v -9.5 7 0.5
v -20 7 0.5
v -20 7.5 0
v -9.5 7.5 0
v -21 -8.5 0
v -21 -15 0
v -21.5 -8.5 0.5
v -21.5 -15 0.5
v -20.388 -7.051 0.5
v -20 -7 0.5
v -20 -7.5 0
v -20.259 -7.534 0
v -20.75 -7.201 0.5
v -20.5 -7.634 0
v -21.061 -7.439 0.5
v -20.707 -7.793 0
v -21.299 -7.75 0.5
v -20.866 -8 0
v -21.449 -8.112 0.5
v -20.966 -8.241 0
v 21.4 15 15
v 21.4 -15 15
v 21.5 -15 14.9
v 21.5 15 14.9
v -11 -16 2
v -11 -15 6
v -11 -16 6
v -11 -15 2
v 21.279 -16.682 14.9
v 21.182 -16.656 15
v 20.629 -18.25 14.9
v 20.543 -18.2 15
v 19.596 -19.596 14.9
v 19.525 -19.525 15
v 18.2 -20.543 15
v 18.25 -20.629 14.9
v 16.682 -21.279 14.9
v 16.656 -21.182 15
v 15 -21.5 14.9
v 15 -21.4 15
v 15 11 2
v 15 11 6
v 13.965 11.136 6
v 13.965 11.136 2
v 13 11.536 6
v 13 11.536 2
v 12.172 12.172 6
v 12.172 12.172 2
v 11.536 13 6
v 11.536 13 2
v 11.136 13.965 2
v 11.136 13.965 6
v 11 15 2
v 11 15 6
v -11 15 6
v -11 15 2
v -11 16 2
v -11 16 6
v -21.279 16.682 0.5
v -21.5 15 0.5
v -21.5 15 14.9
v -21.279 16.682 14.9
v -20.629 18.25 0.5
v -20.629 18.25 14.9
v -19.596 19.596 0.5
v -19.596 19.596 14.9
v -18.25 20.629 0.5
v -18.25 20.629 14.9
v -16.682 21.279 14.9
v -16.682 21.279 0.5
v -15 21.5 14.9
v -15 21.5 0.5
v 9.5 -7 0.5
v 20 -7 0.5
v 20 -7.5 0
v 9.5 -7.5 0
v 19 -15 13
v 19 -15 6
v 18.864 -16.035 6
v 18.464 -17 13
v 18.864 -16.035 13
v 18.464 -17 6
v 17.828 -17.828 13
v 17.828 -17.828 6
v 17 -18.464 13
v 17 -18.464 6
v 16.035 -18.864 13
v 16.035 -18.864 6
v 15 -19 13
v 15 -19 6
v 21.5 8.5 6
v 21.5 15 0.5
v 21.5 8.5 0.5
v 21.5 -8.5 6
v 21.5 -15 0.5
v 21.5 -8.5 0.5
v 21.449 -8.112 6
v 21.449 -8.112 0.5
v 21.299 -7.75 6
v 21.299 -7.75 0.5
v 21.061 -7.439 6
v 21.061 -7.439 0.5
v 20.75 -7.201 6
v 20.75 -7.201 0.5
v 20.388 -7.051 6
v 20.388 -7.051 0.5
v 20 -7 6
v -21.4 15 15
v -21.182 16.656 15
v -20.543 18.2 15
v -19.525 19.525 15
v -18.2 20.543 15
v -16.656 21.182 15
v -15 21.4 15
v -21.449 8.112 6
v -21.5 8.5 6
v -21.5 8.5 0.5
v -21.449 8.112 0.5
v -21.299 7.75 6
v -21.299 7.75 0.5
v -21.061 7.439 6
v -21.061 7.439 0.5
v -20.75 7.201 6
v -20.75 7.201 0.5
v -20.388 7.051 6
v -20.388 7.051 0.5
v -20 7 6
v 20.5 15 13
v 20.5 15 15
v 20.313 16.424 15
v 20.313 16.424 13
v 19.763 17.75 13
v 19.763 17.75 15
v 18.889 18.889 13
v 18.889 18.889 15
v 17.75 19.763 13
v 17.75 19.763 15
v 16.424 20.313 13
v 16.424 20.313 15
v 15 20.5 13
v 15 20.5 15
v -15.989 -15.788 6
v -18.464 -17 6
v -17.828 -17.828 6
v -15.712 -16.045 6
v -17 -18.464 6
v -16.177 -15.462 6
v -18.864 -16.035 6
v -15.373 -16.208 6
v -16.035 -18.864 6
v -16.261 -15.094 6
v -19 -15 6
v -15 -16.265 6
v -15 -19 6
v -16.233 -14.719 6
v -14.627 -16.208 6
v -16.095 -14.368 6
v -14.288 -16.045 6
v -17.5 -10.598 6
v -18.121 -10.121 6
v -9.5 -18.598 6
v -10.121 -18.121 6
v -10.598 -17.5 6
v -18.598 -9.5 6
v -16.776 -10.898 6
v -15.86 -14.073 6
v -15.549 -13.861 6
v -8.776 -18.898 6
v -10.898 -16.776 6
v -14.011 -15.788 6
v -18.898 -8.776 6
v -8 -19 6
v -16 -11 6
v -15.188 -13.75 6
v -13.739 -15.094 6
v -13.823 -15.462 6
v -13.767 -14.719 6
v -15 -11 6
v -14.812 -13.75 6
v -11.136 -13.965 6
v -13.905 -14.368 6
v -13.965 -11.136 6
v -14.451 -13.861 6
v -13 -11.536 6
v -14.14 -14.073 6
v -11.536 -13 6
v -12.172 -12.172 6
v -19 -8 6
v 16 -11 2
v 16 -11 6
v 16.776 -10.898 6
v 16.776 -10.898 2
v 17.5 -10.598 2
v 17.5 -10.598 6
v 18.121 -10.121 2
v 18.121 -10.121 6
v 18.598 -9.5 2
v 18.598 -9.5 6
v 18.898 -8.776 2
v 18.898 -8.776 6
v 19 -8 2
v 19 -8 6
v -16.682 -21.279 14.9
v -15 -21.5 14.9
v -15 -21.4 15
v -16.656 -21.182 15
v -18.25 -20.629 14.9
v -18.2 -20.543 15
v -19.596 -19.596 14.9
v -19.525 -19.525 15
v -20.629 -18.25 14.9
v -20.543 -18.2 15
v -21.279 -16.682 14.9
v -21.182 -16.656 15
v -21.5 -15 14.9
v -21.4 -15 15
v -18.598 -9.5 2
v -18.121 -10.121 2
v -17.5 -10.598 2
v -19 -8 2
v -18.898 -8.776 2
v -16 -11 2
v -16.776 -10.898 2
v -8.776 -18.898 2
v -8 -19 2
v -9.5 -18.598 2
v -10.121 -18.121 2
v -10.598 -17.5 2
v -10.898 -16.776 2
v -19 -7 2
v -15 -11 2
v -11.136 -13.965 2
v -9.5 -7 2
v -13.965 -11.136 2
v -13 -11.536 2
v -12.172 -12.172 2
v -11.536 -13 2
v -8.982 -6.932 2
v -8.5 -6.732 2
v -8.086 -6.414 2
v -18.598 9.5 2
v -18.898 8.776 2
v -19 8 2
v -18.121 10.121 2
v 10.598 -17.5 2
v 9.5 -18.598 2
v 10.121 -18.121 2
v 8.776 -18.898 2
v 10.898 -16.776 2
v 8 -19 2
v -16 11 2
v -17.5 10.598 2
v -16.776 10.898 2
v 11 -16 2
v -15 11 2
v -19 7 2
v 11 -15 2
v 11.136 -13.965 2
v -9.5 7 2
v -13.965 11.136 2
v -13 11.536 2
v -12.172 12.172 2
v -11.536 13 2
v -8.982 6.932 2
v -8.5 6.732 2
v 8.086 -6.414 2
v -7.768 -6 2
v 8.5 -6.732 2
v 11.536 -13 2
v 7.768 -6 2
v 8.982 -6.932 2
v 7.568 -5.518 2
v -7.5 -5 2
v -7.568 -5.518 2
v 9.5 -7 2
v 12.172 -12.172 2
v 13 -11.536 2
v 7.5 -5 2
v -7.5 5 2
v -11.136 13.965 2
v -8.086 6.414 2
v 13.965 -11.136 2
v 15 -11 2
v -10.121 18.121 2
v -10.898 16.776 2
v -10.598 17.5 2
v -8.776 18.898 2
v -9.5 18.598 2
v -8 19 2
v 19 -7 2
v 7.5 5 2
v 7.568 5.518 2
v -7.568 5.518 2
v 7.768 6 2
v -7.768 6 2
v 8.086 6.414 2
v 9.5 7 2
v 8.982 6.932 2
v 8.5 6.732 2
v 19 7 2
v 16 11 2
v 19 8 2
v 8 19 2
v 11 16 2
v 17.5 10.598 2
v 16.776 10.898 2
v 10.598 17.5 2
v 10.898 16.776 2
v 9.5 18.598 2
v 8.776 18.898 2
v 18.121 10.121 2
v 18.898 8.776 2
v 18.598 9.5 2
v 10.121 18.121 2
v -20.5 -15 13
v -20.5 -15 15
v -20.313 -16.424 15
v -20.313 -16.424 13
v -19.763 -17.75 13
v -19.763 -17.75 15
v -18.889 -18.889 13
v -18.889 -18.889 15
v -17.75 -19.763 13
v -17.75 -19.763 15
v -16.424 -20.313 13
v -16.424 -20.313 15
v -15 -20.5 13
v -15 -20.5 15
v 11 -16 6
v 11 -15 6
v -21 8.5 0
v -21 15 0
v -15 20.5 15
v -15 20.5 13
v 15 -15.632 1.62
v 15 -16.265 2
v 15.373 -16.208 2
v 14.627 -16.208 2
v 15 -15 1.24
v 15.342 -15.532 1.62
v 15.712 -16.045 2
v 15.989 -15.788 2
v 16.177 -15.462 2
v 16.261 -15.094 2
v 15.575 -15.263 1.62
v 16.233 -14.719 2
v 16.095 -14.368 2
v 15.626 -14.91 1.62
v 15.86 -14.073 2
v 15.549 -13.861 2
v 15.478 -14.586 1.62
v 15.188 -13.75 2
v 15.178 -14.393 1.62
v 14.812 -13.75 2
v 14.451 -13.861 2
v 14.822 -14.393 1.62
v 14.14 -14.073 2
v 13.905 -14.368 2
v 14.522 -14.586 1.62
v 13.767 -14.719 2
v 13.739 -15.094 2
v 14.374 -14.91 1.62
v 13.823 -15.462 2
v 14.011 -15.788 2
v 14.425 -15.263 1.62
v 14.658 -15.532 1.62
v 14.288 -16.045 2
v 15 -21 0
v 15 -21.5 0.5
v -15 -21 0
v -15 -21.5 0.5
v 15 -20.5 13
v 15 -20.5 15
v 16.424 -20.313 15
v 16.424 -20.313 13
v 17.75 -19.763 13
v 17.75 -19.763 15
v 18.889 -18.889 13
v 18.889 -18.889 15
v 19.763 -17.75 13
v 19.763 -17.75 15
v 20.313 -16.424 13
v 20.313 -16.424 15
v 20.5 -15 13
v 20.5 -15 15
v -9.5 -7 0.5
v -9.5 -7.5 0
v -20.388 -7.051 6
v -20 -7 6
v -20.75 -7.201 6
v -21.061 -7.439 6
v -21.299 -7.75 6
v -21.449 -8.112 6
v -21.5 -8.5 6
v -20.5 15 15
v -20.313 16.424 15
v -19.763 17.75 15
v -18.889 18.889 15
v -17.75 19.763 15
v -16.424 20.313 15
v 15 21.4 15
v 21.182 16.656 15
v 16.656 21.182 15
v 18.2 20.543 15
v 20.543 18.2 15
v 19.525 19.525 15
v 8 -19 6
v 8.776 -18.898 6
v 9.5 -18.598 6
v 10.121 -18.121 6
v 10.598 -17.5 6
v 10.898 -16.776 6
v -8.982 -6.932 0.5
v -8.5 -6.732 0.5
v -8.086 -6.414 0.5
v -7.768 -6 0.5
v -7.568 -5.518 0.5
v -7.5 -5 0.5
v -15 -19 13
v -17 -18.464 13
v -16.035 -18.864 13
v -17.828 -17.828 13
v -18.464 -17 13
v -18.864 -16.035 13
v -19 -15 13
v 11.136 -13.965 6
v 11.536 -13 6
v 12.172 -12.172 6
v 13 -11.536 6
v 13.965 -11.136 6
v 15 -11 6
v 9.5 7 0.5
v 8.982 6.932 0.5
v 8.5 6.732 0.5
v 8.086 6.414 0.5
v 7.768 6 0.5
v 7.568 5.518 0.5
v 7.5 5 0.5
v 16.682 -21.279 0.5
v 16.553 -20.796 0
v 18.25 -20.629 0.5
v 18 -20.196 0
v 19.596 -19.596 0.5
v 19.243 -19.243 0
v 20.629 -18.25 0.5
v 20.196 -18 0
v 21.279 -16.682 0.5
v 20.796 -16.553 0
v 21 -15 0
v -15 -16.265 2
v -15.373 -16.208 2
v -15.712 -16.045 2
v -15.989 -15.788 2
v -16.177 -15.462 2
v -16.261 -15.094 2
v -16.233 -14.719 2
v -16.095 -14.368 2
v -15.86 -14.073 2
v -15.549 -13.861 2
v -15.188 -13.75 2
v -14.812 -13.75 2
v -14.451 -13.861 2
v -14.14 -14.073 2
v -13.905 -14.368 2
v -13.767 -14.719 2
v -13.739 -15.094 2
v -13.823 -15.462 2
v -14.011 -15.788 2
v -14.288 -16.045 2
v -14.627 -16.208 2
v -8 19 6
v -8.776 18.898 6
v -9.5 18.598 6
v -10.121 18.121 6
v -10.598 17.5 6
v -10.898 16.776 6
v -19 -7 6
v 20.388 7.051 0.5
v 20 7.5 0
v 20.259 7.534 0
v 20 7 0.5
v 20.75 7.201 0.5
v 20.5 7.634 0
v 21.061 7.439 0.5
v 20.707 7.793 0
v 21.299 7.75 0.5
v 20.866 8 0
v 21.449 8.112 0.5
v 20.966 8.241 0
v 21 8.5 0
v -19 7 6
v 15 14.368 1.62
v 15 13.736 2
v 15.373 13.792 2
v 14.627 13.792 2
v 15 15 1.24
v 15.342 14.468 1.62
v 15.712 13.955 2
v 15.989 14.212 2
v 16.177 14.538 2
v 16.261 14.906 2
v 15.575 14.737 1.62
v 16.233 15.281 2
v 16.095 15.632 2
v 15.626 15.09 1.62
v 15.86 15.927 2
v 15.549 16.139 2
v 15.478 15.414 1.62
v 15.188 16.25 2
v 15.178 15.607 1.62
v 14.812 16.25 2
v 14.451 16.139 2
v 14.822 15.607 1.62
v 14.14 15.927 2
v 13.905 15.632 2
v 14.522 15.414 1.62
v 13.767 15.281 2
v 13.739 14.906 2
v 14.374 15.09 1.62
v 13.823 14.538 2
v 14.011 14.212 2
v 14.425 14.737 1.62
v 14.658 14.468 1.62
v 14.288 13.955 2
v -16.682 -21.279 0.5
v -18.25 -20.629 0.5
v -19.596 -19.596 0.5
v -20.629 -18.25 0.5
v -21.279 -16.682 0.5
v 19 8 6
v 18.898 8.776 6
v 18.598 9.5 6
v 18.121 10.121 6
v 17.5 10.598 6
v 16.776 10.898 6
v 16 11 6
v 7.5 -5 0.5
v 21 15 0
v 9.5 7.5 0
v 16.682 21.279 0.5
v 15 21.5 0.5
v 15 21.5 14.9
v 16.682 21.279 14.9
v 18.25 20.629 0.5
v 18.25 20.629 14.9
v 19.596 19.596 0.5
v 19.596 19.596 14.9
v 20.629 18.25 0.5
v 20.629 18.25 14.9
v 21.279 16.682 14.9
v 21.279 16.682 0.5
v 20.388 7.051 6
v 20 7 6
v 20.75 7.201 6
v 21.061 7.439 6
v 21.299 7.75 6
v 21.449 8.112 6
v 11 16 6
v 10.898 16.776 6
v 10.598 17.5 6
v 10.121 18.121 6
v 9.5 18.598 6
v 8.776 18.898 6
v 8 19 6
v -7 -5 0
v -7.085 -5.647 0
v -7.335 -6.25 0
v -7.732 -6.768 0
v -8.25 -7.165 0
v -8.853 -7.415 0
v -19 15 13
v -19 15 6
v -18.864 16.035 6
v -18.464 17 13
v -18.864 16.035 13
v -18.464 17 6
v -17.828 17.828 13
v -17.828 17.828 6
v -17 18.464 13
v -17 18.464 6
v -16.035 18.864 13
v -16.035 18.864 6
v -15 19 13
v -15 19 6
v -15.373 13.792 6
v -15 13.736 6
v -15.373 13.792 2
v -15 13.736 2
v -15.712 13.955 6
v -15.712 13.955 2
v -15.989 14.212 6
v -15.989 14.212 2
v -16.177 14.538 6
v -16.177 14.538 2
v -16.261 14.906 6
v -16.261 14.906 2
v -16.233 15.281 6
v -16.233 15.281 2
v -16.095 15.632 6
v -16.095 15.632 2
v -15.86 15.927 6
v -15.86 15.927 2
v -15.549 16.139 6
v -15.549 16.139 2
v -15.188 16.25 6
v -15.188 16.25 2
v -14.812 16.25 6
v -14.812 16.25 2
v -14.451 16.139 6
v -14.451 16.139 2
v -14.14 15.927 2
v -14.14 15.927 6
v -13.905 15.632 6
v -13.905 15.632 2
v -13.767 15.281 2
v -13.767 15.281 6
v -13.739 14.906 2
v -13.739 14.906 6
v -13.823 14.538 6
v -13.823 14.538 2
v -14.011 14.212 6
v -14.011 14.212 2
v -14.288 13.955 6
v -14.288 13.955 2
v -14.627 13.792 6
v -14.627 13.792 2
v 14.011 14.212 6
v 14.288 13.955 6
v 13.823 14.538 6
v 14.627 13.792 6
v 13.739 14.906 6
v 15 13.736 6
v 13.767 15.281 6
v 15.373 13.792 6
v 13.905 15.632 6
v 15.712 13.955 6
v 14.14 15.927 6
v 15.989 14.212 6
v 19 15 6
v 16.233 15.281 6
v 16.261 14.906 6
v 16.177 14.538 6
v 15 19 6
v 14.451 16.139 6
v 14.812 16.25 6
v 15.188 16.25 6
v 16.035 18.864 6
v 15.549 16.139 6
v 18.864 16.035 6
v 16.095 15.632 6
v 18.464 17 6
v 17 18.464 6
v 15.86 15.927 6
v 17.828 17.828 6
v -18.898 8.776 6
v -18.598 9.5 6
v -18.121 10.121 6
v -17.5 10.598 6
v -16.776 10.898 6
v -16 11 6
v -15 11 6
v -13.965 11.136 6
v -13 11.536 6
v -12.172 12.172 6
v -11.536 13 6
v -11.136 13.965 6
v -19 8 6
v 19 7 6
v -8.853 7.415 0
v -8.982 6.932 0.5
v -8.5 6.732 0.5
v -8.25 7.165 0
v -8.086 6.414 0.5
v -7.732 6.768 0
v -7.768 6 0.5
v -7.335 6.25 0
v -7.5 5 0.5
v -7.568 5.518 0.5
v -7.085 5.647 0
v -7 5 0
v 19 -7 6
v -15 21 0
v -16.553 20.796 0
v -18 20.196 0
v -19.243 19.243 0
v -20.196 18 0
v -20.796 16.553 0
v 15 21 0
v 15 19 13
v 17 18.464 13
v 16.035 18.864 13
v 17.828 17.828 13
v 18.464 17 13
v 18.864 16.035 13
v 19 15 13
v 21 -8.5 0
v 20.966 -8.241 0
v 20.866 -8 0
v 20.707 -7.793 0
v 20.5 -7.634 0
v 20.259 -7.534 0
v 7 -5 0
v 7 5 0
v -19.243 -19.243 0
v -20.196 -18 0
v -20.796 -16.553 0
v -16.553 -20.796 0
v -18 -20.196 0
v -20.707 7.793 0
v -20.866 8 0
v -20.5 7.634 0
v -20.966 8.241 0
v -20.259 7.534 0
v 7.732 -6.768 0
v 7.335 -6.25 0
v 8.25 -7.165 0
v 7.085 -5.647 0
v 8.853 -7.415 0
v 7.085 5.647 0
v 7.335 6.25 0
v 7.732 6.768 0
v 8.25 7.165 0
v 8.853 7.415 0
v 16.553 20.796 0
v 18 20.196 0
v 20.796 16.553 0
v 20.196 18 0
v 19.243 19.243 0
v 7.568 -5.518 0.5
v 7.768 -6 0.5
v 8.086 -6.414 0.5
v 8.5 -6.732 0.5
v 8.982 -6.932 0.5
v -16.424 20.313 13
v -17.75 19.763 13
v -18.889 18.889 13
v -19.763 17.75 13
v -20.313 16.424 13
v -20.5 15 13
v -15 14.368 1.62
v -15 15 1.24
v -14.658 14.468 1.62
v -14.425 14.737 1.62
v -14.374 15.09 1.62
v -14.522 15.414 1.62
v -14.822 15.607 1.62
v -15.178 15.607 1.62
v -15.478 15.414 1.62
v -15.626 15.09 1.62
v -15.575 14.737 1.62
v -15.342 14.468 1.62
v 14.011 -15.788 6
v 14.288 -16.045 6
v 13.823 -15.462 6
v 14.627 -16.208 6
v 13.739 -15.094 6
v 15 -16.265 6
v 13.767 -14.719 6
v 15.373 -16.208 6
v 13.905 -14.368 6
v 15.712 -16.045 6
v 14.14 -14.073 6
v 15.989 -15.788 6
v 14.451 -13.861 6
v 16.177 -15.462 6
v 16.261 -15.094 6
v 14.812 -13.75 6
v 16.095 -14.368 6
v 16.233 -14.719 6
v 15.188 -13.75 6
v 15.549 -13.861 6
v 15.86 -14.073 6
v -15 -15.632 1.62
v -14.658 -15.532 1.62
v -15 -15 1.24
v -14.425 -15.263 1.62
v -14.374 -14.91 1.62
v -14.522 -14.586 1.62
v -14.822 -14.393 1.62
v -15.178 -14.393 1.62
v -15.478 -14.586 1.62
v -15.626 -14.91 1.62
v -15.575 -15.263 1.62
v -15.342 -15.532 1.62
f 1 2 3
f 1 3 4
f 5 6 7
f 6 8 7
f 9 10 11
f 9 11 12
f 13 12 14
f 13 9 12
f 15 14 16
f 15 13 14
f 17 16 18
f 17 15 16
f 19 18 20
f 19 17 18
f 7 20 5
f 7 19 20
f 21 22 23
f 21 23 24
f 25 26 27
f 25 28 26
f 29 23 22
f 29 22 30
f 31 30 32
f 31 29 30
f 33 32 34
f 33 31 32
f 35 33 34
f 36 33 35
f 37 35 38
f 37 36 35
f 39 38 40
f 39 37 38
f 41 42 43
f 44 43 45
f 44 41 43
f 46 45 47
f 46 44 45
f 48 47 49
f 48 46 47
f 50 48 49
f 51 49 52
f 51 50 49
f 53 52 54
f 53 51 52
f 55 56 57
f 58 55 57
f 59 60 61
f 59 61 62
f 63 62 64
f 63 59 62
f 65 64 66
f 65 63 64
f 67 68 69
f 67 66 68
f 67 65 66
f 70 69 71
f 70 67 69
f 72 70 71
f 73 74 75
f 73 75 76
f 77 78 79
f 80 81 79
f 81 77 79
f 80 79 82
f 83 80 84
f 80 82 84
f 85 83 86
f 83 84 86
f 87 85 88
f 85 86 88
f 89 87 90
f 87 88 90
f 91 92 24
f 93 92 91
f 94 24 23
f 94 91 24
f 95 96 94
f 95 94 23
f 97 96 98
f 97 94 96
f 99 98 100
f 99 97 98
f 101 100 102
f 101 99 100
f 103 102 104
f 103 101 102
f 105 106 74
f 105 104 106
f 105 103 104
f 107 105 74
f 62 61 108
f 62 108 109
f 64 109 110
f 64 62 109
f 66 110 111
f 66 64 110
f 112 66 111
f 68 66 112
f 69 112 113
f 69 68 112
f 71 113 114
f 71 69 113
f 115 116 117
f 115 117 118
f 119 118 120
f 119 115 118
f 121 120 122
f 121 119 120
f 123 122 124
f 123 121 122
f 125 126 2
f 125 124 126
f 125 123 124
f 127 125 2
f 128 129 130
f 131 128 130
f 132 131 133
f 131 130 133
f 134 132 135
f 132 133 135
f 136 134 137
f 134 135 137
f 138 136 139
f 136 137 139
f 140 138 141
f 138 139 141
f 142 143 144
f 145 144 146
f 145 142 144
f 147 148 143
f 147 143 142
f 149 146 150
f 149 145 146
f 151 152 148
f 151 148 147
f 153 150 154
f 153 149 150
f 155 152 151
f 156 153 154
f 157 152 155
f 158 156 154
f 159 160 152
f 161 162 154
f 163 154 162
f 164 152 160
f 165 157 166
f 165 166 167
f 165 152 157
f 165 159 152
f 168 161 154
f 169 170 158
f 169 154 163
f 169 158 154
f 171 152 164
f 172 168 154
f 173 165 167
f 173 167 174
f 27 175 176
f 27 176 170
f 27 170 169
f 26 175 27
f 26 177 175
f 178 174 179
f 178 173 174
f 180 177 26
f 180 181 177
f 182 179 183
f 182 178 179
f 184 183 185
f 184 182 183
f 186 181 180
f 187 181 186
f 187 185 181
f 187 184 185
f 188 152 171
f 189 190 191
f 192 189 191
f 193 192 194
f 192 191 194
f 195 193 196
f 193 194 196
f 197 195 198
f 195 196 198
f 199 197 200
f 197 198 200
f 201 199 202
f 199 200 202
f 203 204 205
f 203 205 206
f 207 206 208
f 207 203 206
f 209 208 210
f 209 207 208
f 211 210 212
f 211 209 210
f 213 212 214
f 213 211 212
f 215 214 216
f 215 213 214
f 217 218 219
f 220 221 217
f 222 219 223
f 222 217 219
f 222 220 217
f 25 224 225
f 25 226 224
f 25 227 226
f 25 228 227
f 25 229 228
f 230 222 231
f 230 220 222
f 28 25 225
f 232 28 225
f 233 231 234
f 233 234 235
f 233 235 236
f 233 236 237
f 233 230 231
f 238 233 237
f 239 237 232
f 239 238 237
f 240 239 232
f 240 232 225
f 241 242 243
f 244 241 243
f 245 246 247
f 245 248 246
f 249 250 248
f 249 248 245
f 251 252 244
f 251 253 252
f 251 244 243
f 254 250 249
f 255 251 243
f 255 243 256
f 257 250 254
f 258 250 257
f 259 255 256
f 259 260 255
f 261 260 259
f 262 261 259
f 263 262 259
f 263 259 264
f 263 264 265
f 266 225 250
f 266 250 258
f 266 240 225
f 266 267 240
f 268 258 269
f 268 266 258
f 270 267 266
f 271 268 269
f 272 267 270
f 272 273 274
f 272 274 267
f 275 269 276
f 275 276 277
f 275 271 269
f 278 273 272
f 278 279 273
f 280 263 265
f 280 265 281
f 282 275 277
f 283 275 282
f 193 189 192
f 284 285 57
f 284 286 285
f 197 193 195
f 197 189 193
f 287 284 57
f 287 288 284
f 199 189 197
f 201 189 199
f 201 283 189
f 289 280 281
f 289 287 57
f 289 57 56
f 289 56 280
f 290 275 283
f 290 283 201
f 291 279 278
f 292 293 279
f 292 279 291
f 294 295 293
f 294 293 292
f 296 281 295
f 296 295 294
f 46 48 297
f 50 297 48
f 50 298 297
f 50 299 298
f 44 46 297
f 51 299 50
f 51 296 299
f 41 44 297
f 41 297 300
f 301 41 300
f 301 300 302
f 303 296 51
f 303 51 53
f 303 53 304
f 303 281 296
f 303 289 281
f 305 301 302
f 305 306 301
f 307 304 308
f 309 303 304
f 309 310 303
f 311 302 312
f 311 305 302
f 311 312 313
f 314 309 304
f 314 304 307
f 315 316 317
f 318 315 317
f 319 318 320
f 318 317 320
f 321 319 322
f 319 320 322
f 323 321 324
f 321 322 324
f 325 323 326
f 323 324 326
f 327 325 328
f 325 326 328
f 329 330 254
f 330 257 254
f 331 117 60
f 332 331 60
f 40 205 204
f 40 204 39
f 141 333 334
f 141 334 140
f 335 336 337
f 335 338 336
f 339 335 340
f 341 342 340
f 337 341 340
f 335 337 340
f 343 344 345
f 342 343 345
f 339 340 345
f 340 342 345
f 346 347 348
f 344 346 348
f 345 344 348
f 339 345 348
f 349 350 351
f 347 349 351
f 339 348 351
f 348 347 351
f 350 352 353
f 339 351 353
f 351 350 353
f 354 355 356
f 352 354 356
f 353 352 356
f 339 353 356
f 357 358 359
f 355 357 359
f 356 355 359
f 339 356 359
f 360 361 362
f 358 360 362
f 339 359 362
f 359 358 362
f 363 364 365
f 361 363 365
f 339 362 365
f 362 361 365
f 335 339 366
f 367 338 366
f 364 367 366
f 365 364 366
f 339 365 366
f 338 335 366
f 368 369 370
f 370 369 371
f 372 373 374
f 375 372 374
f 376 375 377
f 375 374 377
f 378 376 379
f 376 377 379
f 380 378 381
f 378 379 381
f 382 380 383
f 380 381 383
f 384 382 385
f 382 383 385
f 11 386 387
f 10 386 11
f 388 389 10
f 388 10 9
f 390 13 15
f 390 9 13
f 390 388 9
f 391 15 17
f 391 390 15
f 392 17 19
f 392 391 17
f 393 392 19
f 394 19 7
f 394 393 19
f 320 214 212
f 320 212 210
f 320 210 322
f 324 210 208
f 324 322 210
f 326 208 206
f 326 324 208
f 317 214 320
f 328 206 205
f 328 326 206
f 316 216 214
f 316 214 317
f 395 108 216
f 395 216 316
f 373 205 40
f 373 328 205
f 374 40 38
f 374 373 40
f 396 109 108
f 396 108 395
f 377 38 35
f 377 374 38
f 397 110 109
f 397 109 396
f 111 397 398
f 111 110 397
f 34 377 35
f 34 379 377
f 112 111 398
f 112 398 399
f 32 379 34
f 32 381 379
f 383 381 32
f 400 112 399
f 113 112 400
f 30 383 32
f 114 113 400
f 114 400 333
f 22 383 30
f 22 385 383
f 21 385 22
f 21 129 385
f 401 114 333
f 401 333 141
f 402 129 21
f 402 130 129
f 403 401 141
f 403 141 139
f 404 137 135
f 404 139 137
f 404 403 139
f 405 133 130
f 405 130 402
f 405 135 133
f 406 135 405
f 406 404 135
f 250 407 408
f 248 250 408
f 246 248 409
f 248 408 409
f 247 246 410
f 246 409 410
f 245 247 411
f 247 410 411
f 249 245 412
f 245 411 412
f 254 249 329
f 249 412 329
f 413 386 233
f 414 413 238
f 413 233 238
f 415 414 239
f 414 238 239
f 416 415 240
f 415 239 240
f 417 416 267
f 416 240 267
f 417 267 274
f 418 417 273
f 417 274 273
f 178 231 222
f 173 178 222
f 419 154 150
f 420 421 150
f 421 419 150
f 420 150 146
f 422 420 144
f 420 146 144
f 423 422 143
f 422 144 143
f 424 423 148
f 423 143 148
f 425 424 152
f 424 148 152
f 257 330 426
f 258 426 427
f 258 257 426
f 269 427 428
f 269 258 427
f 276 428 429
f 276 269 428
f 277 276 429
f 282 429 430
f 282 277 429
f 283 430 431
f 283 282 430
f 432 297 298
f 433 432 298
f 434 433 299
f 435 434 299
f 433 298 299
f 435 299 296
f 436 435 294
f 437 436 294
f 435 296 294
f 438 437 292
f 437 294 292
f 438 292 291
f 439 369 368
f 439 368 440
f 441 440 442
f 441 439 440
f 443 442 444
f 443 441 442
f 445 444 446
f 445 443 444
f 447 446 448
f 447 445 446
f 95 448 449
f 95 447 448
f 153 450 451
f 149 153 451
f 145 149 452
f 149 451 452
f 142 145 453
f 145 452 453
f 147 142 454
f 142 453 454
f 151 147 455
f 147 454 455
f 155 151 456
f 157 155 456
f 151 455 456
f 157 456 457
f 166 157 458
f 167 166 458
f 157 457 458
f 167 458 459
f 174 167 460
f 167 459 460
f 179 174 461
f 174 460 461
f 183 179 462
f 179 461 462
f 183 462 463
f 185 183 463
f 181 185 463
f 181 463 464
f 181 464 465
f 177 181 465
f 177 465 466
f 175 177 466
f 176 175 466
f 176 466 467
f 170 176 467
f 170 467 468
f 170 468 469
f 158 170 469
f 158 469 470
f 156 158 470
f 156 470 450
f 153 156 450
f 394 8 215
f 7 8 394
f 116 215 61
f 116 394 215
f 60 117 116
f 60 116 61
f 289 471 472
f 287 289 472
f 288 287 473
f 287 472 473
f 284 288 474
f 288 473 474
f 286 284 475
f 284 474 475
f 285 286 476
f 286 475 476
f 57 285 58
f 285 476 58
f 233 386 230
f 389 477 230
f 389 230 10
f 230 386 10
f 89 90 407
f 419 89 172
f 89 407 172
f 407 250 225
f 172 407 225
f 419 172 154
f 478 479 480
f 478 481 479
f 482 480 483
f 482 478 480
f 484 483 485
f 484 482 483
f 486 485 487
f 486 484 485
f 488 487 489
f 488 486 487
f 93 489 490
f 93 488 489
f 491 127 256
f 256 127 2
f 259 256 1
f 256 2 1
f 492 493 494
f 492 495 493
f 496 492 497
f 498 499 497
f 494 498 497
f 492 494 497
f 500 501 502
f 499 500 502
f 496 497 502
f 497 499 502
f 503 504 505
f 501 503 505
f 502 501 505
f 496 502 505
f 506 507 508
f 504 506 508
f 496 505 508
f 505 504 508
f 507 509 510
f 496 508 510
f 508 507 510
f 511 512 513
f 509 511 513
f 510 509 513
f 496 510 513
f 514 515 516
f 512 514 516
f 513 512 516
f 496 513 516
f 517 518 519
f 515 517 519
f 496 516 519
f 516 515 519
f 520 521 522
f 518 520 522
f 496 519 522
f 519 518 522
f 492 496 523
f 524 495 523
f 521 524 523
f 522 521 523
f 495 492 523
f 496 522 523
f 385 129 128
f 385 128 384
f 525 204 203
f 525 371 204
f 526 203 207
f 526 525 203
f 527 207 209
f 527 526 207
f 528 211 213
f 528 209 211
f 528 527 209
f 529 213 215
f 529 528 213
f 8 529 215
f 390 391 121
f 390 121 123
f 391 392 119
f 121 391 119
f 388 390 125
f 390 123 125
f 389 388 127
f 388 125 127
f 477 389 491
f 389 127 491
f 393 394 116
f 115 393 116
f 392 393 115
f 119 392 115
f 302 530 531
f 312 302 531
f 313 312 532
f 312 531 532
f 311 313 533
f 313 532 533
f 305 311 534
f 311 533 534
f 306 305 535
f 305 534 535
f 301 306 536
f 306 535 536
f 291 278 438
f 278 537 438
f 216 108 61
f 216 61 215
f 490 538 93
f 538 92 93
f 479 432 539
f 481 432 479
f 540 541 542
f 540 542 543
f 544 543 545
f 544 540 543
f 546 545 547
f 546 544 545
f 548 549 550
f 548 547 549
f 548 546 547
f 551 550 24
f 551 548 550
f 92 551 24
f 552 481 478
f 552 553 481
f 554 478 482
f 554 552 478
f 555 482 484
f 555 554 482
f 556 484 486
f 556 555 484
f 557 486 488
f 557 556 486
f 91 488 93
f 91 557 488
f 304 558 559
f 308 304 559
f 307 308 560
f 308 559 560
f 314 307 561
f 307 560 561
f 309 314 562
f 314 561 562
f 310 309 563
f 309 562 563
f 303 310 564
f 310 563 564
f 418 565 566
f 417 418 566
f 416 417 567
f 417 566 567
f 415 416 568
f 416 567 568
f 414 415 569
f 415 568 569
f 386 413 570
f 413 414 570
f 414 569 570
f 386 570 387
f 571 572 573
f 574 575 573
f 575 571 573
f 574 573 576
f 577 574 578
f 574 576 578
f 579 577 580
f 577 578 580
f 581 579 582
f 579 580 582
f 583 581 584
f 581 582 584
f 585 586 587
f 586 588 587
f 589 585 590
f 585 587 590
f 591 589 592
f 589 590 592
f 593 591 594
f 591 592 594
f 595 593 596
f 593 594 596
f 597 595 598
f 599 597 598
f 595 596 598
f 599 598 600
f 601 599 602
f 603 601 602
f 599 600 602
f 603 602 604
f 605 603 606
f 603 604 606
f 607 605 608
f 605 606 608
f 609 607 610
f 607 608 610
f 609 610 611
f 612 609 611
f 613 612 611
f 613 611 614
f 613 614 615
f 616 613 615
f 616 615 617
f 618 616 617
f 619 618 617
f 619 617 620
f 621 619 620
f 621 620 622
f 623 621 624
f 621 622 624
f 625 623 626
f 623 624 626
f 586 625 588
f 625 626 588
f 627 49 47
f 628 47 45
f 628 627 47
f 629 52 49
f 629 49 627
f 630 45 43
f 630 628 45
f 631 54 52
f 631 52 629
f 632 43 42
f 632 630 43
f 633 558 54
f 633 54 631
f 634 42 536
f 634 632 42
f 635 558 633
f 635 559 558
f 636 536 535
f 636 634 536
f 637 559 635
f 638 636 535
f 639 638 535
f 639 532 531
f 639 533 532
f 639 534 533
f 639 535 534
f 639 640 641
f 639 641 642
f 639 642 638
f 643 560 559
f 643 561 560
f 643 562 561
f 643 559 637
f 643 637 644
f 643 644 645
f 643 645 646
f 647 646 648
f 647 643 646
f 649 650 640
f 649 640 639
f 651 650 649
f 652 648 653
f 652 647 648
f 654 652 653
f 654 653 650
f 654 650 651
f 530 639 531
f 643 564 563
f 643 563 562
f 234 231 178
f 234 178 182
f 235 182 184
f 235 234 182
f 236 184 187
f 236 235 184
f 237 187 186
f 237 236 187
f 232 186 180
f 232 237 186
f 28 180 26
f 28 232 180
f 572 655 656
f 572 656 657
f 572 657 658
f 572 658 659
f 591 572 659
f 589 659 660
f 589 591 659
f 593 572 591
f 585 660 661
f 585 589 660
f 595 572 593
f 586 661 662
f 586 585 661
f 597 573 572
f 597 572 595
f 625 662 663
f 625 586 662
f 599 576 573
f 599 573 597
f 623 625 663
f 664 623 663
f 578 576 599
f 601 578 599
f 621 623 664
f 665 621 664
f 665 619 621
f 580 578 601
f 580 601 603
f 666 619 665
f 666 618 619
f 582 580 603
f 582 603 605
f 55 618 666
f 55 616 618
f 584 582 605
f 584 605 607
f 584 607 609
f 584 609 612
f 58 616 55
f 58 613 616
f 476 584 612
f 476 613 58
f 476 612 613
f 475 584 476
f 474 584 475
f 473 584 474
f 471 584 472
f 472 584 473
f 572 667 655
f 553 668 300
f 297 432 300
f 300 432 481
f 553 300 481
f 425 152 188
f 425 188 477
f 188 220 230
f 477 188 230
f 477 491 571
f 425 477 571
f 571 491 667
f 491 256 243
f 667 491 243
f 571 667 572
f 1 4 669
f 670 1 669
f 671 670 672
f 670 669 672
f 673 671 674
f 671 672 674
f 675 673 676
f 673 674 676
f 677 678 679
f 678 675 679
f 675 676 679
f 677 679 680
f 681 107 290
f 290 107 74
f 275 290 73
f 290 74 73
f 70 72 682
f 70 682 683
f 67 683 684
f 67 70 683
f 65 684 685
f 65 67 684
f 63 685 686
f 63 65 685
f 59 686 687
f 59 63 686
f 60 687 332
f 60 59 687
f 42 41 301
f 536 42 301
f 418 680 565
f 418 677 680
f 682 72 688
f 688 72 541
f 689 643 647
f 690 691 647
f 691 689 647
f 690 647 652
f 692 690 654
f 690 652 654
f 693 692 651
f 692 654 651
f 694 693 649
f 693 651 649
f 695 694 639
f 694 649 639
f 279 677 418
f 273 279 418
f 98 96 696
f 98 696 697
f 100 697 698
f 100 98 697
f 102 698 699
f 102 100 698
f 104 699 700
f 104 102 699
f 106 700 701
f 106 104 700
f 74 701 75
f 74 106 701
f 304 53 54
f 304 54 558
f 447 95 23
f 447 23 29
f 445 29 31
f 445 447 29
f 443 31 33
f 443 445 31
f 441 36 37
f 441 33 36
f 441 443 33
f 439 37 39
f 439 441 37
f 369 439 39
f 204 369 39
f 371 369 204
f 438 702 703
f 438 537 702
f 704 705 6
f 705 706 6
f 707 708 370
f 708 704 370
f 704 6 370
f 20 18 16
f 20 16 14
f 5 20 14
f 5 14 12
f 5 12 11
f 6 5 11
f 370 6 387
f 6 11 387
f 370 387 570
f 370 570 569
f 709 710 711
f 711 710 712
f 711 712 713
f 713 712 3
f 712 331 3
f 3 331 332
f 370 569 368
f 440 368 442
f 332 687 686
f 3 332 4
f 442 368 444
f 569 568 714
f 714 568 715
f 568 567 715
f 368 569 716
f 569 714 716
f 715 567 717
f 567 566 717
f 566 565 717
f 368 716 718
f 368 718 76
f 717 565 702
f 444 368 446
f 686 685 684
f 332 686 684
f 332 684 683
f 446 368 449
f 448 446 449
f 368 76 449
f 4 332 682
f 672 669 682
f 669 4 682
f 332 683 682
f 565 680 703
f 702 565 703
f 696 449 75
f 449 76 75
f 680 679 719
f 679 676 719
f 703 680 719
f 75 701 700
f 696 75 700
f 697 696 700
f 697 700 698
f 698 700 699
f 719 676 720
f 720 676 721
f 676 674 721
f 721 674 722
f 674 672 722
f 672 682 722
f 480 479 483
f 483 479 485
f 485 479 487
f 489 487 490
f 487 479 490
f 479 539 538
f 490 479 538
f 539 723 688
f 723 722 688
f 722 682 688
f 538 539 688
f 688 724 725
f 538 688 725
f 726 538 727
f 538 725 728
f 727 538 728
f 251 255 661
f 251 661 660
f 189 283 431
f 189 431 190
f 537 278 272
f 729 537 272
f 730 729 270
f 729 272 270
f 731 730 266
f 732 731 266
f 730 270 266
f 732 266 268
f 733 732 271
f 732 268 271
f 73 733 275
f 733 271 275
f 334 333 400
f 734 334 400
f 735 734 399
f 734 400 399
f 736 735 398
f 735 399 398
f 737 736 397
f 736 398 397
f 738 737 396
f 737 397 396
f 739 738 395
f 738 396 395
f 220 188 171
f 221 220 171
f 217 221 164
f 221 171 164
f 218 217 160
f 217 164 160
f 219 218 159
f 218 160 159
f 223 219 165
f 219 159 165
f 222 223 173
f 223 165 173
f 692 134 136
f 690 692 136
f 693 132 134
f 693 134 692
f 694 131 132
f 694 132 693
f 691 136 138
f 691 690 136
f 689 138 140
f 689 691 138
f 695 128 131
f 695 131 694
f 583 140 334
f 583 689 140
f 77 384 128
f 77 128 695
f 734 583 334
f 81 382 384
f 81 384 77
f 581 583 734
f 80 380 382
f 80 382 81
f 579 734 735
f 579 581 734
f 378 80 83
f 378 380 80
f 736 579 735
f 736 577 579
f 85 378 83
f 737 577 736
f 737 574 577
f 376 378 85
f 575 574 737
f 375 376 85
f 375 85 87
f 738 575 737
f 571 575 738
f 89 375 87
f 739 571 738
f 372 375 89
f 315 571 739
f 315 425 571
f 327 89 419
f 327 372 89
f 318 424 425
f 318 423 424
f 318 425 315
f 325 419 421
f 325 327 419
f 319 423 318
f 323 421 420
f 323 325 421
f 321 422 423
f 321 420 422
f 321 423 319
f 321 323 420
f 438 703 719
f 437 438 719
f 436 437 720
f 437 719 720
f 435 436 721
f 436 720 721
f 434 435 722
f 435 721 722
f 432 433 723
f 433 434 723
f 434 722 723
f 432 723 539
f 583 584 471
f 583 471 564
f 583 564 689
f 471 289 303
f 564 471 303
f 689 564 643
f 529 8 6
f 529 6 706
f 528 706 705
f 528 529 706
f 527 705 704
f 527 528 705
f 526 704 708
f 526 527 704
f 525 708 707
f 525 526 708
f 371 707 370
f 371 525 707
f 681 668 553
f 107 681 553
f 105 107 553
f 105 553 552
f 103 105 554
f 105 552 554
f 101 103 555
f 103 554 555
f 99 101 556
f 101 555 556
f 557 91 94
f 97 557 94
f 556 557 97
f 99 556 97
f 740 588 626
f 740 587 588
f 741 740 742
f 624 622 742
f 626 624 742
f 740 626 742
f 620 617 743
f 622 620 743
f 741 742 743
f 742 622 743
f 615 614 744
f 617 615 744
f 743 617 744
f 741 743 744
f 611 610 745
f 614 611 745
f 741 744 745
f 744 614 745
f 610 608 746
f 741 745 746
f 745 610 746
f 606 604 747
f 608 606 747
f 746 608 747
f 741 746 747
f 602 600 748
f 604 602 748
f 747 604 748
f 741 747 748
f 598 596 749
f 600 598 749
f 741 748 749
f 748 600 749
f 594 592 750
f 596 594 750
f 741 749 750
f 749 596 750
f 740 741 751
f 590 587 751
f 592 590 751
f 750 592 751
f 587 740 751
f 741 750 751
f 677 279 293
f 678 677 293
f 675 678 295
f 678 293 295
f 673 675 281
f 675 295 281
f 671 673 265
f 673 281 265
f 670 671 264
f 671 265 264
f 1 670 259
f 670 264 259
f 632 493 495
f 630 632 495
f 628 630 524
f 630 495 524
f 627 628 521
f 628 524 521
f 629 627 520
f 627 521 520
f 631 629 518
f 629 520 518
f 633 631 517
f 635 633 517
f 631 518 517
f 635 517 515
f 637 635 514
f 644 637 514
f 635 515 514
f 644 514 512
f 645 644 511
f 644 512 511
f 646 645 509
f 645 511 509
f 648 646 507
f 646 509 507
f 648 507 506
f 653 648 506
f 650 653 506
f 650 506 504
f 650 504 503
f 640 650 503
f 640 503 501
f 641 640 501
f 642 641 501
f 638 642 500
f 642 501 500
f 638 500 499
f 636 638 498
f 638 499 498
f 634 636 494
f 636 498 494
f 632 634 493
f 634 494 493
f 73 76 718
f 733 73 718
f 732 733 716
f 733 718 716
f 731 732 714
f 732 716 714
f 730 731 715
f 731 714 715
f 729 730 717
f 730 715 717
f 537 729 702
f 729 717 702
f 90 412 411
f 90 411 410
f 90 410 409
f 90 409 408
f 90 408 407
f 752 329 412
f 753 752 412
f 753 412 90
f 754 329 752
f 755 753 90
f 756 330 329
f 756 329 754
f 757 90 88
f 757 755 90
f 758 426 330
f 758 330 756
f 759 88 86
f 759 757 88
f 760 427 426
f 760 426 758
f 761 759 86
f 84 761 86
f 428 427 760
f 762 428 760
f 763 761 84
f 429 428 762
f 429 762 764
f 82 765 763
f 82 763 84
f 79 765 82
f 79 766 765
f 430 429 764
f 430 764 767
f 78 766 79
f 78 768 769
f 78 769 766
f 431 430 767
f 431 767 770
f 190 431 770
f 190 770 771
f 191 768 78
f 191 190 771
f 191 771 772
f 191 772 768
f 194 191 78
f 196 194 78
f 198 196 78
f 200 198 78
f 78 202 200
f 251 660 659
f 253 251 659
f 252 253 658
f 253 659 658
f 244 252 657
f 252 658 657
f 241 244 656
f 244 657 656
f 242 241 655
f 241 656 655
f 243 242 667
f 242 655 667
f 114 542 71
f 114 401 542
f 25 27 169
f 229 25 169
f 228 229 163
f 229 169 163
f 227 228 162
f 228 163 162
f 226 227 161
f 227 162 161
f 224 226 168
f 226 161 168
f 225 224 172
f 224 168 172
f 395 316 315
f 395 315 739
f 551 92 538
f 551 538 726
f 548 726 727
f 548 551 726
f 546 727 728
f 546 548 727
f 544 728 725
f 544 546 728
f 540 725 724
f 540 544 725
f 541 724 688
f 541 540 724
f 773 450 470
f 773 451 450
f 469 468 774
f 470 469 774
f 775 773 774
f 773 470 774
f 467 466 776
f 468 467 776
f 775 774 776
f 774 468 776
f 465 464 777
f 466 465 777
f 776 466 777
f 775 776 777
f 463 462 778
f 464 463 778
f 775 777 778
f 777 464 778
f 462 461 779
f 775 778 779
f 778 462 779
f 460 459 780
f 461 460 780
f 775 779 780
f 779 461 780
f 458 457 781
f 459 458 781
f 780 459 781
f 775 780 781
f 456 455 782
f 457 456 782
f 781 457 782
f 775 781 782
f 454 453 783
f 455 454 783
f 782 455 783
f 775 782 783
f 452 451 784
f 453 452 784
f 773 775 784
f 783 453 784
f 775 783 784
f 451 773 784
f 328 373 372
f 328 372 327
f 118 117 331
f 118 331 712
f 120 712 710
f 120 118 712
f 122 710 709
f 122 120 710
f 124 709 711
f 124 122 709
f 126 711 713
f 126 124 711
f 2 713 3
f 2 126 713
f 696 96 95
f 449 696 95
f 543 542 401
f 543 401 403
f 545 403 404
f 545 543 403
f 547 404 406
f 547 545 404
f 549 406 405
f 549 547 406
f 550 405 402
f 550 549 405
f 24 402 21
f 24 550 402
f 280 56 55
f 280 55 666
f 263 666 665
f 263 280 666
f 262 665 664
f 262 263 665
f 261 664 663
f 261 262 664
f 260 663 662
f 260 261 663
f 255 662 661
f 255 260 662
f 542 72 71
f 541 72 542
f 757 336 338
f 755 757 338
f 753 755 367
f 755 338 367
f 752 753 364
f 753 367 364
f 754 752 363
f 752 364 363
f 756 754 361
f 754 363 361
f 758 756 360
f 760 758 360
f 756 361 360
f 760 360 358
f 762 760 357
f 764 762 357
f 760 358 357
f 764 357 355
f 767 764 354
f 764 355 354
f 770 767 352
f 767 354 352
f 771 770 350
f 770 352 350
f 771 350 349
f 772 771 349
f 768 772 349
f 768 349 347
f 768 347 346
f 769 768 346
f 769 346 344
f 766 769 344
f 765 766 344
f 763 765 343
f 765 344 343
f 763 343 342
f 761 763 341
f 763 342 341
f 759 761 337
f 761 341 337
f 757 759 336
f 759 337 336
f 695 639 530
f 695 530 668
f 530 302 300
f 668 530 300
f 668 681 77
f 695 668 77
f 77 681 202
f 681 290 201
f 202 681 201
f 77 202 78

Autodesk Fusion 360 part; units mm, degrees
sketch "sketch_for_main_body_shape" plane through (0, 0, 0) normal (0, 0, 1) x (1, 0, 0)
  line L0 (15, -18.5) -> (-15, -18.5) construction
  line L1 (-18.5, -15) -> (-18.5, 15) construction
  line L2 (-15, 18.5) -> (15, 18.5) construction
  line L3 (18.5, 15) -> (18.5, -15) construction
  line L4 (18.5, -18.5) -> (-18.5, 18.5) construction
  line L5 (-18.5, -18.5) -> (18.5, 18.5) construction
  arc A0 (-15, 18.5) -> (-18.5, 15) centre (-15, 15) ccw construction
  arc A1 (-18.5, -15) -> (-15, -18.5) centre (-15, -15) ccw construction
  arc A2 (15, -18.5) -> (18.5, -15) centre (15, -15) ccw construction
  arc A3 (18.5, 15) -> (15, 18.5) centre (15, 15) ccw construction
  arc A4 (19, 15) -> (15, 19) centre (15, 15) ccw
  line L6 (-15, 19) -> (15, 19)
  arc A5 (-15, 19) -> (-19, 15) centre (-15, 15) ccw
  line L7 (-19, -15) -> (-19, 15)
  arc A6 (-19, -15) -> (-15, -19) centre (-15, -15) ccw
  line L8 (15, -19) -> (-15, -19)
  arc A7 (15, -19) -> (19, -15) centre (15, -15) ccw
  line L9 (19, 15) -> (19, -15)
  arc A8 (21.5, 15) -> (15, 21.5) centre (15, 15) ccw
  line L10 (-15, 21.5) -> (15, 21.5)
  arc A9 (-15, 21.5) -> (-21.5, 15) centre (-15, 15) ccw
  line L11 (-21.5, -15) -> (-21.5, 15)
  arc A10 (-21.5, -15) -> (-15, -21.5) centre (-15, -15) ccw
  line L12 (15, -21.5) -> (-15, -21.5)
  arc A11 (15, -21.5) -> (21.5, -15) centre (15, -15) ccw
  line L13 (21.5, 15) -> (21.5, -15)
  circle A12 centre (-15, 15) radius 4
  line L14 (-11, 15) -> (-11, 19)
  line L15 (-15, 11) -> (-19, 11)
  circle A13 centre (15, 15) radius 4
  line L16 (11, 15) -> (11, 19)
  line L17 (15, 11) -> (19, 11)
  line L18 (-37.3211, 0) -> (37.3211, 0) construction
  line L19 (-11, -15) -> (-11, -19)
  circle A14 centre (-15, -15) radius 4
  line L20 (-15, -11) -> (-19, -11)
  circle A15 centre (15, -15) radius 4
  line L21 (15, -11) -> (19, -11)
  line L22 (11, -15) -> (11, -19)
  line L23 (-7.5, -7) -> (-21.5, -7)
  line L24 (-21.5, -7) -> (-21.5, 7)
  line L25 (-21.5, 7) -> (-7.5, 7)
  line L26 (-7.5, 7) -> (-7.5, -7)
  line L27 (21.5, -7) -> (7.5, -7)
  line L28 (7.5, -7) -> (7.5, 7)
  line L29 (7.5, 7) -> (21.5, 7)
  line L30 (21.5, 7) -> (21.5, -7)
  dimension "d6" = 37
  dimension "d7" = 37
  dimension "d8" = 3.5
  dimension "d9" = -0.5
  dimension "d10" = -3
  dimension "d21" = 14
  dimension "d22" = 14
  dimension "d23" = 14
  dimension "d24" = 14
extrude "Extrude1" add sketch "sketch_for_main_body_shape" along normal blind 2
extrude "Extrude2" add sketch "sketch_for_main_body_shape" along normal blind 15 contours A4 L6 A5 L7 L9 A8 L10 A9 L11 L13 A12 A13 L25 L29 | L9 L13 L27 L29 L30 | L7 A6 L8 A7 L9 L11 A10 L12 A11 L13 A14 A15 L23 L27 | L7 L11 L23 L24 L25
extrude "Extrude3" add sketch "sketch_for_main_body_shape" along normal blind 6 contours A4 A13 | L9 A13 L17 | L6 A13 L16 | L6 A12 L14 | A5 A12 | L9 A15 L21 | L7 A12 L15 | A7 A15 | L8 A15 L22 | L8 L19 A14 | L7 A14 L20 | A6 A14
sketch "sketch_for_holes" plane through (0, 0, 6) normal (0, 0, 1) x (-1, 0, 0)
  line L0 (11, -15) -> (11, -19)
  line L1 (11, -19) -> (15, -19)
  arc A0 (15, -19) -> (19, -15) centre (15, -15) ccw
  line L2 (19, -15) -> (19, -11)
  line L3 (19, -11) -> (15, -11)
  arc A1 (15, -11) -> (11, -15) centre (15, -15) ccw
  point P0 (-15, -15)
  point P1 (15, -15)
  point P2 (15, 15)
  point P3 (-15, 15)
hole "Hole1" at (-15, 15, 6) at (15, 15, 6) at (15, -15, 6) at (-15, -15, 6) direction (0, 0, -1) diameter 2.529 depth 4 tip angle 118
extrude "Extrude4" cut sketch "sketch_for_main_body_shape" along normal blind 6 contours L9 L13 L27 L29 L30 | L9 L27 L28 L29 | L7 L23 L25 L26 | L7 L11 L23 L24 L25
sketch "sketch_for_rim" plane through (0, 0, 15) normal (0, 0, 1) x (-1, 0, 0)
  arc A0 (15, -19) -> (19, -15) centre (15, -15) ccw
  line L0 (15, -19) -> (-15, -19)
  arc A1 (-19, -15) -> (-15, -19) centre (-15, -15) ccw
  line L1 (-19, -15) -> (-19, 15)
  arc A2 (-15, 19) -> (-19, 15) centre (-15, 15) ccw
  line L2 (-15, 19) -> (15, 19)
  arc A3 (19, 15) -> (15, 19) centre (15, 15) ccw
  line L3 (19, 15) -> (19, -15)
  arc A4 (15, -21.5) -> (21.5, -15) centre (15, -15) ccw
  line L4 (21.5, -15) -> (21.5, 15)
  arc A5 (21.5, 15) -> (15, 21.5) centre (15, 15) ccw
  line L5 (15, 21.5) -> (-15, 21.5)
  arc A6 (-15, 21.5) -> (-21.5, 15) centre (-15, 15) ccw
  line L6 (-21.5, 15) -> (-21.5, -15)
  arc A7 (-21.5, -15) -> (-15, -21.5) centre (-15, -15) ccw
  line L7 (-15, -21.5) -> (15, -21.5)
  arc A8 (20.5, 15) -> (15, 20.5) centre (15, 15) ccw
  line L8 (-15, 20.5) -> (15, 20.5)
  arc A9 (-15, 20.5) -> (-20.5, 15) centre (-15, 15) ccw
  line L9 (-20.5, -15) -> (-20.5, 15)
  arc A10 (-20.5, -15) -> (-15, -20.5) centre (-15, -15) ccw
  line L10 (15, -20.5) -> (-15, -20.5)
  arc A11 (15, -20.5) -> (20.5, -15) centre (15, -15) ccw
  line L11 (20.5, 15) -> (20.5, -15)
  dimension "d27" = -1.5
extrude "Extrude5" cut sketch "sketch_for_rim" against normal blind 2 contours A8 L8 A9 L9 A10 L10 A11 L11
fillet "Fillet1" radius 3 8 edges at (11, -19, 4) (19, -11, 4) (19, 11, 4) (11, 19, 4) (-11, 19, 4) (-19, 11, 4) (-19, -11, 4) (-11, -19, 4)
fillet "Fillet2" radius 2 4 edges at (7.5, -7, 1) (7.5, 7, 1) (-7.5, 7, 1) (-7.5, -7, 1)
fillet "Fillet3" radius 1.5 4 edges at (-21.5, 7, 3) (-21.5, -7, 3) (21.5, -7, 3) (21.5, 7, 3)
chamfer "Chamfer1" distance 0.5 angle 45 24 edges at (0, -21.5, 0) (-19.5962, -19.5962, 0) (-21.5, -11.75, 0) (-21.0607, -7.4393, 0) (-14.75, -7, 0) (-8.0858, -6.4142, 0) (-7.5, 0, 0) (-8.0858, 6.4142, 0) (-14.75, 7, 0) (-21.0607, 7.4393, 0) (-21.5, 11.75, 0) (-19.5962, 19.5962, 0) (0, 21.5, 0) (19.5962, 19.5962, 0) (21.5, 11.75, 0) (21.0607, 7.4393, 0) (14.75, 7, 0) (8.0858, 6.4142, 0) (7.5, 0, 0) (8.0858, -6.4142, 0) (14.75, -7, 0) (21.0607, -7.4393, 0) (21.5, -11.75, 0) (19.5962, -19.5962, 0)
chamfer "Chamfer2" distance 0.1 angle 45 8 edges at (21.5, 0, 15) (19.5962, 19.5962, 15) (0, 21.5, 15) (-19.5962, 19.5962, 15) (-21.5, 0, 15) (-19.5962, -19.5962, 15) (0, -21.5, 15) (19.5962, -19.5962, 15)
equation "d21 = 11 mm + 3 mm"
